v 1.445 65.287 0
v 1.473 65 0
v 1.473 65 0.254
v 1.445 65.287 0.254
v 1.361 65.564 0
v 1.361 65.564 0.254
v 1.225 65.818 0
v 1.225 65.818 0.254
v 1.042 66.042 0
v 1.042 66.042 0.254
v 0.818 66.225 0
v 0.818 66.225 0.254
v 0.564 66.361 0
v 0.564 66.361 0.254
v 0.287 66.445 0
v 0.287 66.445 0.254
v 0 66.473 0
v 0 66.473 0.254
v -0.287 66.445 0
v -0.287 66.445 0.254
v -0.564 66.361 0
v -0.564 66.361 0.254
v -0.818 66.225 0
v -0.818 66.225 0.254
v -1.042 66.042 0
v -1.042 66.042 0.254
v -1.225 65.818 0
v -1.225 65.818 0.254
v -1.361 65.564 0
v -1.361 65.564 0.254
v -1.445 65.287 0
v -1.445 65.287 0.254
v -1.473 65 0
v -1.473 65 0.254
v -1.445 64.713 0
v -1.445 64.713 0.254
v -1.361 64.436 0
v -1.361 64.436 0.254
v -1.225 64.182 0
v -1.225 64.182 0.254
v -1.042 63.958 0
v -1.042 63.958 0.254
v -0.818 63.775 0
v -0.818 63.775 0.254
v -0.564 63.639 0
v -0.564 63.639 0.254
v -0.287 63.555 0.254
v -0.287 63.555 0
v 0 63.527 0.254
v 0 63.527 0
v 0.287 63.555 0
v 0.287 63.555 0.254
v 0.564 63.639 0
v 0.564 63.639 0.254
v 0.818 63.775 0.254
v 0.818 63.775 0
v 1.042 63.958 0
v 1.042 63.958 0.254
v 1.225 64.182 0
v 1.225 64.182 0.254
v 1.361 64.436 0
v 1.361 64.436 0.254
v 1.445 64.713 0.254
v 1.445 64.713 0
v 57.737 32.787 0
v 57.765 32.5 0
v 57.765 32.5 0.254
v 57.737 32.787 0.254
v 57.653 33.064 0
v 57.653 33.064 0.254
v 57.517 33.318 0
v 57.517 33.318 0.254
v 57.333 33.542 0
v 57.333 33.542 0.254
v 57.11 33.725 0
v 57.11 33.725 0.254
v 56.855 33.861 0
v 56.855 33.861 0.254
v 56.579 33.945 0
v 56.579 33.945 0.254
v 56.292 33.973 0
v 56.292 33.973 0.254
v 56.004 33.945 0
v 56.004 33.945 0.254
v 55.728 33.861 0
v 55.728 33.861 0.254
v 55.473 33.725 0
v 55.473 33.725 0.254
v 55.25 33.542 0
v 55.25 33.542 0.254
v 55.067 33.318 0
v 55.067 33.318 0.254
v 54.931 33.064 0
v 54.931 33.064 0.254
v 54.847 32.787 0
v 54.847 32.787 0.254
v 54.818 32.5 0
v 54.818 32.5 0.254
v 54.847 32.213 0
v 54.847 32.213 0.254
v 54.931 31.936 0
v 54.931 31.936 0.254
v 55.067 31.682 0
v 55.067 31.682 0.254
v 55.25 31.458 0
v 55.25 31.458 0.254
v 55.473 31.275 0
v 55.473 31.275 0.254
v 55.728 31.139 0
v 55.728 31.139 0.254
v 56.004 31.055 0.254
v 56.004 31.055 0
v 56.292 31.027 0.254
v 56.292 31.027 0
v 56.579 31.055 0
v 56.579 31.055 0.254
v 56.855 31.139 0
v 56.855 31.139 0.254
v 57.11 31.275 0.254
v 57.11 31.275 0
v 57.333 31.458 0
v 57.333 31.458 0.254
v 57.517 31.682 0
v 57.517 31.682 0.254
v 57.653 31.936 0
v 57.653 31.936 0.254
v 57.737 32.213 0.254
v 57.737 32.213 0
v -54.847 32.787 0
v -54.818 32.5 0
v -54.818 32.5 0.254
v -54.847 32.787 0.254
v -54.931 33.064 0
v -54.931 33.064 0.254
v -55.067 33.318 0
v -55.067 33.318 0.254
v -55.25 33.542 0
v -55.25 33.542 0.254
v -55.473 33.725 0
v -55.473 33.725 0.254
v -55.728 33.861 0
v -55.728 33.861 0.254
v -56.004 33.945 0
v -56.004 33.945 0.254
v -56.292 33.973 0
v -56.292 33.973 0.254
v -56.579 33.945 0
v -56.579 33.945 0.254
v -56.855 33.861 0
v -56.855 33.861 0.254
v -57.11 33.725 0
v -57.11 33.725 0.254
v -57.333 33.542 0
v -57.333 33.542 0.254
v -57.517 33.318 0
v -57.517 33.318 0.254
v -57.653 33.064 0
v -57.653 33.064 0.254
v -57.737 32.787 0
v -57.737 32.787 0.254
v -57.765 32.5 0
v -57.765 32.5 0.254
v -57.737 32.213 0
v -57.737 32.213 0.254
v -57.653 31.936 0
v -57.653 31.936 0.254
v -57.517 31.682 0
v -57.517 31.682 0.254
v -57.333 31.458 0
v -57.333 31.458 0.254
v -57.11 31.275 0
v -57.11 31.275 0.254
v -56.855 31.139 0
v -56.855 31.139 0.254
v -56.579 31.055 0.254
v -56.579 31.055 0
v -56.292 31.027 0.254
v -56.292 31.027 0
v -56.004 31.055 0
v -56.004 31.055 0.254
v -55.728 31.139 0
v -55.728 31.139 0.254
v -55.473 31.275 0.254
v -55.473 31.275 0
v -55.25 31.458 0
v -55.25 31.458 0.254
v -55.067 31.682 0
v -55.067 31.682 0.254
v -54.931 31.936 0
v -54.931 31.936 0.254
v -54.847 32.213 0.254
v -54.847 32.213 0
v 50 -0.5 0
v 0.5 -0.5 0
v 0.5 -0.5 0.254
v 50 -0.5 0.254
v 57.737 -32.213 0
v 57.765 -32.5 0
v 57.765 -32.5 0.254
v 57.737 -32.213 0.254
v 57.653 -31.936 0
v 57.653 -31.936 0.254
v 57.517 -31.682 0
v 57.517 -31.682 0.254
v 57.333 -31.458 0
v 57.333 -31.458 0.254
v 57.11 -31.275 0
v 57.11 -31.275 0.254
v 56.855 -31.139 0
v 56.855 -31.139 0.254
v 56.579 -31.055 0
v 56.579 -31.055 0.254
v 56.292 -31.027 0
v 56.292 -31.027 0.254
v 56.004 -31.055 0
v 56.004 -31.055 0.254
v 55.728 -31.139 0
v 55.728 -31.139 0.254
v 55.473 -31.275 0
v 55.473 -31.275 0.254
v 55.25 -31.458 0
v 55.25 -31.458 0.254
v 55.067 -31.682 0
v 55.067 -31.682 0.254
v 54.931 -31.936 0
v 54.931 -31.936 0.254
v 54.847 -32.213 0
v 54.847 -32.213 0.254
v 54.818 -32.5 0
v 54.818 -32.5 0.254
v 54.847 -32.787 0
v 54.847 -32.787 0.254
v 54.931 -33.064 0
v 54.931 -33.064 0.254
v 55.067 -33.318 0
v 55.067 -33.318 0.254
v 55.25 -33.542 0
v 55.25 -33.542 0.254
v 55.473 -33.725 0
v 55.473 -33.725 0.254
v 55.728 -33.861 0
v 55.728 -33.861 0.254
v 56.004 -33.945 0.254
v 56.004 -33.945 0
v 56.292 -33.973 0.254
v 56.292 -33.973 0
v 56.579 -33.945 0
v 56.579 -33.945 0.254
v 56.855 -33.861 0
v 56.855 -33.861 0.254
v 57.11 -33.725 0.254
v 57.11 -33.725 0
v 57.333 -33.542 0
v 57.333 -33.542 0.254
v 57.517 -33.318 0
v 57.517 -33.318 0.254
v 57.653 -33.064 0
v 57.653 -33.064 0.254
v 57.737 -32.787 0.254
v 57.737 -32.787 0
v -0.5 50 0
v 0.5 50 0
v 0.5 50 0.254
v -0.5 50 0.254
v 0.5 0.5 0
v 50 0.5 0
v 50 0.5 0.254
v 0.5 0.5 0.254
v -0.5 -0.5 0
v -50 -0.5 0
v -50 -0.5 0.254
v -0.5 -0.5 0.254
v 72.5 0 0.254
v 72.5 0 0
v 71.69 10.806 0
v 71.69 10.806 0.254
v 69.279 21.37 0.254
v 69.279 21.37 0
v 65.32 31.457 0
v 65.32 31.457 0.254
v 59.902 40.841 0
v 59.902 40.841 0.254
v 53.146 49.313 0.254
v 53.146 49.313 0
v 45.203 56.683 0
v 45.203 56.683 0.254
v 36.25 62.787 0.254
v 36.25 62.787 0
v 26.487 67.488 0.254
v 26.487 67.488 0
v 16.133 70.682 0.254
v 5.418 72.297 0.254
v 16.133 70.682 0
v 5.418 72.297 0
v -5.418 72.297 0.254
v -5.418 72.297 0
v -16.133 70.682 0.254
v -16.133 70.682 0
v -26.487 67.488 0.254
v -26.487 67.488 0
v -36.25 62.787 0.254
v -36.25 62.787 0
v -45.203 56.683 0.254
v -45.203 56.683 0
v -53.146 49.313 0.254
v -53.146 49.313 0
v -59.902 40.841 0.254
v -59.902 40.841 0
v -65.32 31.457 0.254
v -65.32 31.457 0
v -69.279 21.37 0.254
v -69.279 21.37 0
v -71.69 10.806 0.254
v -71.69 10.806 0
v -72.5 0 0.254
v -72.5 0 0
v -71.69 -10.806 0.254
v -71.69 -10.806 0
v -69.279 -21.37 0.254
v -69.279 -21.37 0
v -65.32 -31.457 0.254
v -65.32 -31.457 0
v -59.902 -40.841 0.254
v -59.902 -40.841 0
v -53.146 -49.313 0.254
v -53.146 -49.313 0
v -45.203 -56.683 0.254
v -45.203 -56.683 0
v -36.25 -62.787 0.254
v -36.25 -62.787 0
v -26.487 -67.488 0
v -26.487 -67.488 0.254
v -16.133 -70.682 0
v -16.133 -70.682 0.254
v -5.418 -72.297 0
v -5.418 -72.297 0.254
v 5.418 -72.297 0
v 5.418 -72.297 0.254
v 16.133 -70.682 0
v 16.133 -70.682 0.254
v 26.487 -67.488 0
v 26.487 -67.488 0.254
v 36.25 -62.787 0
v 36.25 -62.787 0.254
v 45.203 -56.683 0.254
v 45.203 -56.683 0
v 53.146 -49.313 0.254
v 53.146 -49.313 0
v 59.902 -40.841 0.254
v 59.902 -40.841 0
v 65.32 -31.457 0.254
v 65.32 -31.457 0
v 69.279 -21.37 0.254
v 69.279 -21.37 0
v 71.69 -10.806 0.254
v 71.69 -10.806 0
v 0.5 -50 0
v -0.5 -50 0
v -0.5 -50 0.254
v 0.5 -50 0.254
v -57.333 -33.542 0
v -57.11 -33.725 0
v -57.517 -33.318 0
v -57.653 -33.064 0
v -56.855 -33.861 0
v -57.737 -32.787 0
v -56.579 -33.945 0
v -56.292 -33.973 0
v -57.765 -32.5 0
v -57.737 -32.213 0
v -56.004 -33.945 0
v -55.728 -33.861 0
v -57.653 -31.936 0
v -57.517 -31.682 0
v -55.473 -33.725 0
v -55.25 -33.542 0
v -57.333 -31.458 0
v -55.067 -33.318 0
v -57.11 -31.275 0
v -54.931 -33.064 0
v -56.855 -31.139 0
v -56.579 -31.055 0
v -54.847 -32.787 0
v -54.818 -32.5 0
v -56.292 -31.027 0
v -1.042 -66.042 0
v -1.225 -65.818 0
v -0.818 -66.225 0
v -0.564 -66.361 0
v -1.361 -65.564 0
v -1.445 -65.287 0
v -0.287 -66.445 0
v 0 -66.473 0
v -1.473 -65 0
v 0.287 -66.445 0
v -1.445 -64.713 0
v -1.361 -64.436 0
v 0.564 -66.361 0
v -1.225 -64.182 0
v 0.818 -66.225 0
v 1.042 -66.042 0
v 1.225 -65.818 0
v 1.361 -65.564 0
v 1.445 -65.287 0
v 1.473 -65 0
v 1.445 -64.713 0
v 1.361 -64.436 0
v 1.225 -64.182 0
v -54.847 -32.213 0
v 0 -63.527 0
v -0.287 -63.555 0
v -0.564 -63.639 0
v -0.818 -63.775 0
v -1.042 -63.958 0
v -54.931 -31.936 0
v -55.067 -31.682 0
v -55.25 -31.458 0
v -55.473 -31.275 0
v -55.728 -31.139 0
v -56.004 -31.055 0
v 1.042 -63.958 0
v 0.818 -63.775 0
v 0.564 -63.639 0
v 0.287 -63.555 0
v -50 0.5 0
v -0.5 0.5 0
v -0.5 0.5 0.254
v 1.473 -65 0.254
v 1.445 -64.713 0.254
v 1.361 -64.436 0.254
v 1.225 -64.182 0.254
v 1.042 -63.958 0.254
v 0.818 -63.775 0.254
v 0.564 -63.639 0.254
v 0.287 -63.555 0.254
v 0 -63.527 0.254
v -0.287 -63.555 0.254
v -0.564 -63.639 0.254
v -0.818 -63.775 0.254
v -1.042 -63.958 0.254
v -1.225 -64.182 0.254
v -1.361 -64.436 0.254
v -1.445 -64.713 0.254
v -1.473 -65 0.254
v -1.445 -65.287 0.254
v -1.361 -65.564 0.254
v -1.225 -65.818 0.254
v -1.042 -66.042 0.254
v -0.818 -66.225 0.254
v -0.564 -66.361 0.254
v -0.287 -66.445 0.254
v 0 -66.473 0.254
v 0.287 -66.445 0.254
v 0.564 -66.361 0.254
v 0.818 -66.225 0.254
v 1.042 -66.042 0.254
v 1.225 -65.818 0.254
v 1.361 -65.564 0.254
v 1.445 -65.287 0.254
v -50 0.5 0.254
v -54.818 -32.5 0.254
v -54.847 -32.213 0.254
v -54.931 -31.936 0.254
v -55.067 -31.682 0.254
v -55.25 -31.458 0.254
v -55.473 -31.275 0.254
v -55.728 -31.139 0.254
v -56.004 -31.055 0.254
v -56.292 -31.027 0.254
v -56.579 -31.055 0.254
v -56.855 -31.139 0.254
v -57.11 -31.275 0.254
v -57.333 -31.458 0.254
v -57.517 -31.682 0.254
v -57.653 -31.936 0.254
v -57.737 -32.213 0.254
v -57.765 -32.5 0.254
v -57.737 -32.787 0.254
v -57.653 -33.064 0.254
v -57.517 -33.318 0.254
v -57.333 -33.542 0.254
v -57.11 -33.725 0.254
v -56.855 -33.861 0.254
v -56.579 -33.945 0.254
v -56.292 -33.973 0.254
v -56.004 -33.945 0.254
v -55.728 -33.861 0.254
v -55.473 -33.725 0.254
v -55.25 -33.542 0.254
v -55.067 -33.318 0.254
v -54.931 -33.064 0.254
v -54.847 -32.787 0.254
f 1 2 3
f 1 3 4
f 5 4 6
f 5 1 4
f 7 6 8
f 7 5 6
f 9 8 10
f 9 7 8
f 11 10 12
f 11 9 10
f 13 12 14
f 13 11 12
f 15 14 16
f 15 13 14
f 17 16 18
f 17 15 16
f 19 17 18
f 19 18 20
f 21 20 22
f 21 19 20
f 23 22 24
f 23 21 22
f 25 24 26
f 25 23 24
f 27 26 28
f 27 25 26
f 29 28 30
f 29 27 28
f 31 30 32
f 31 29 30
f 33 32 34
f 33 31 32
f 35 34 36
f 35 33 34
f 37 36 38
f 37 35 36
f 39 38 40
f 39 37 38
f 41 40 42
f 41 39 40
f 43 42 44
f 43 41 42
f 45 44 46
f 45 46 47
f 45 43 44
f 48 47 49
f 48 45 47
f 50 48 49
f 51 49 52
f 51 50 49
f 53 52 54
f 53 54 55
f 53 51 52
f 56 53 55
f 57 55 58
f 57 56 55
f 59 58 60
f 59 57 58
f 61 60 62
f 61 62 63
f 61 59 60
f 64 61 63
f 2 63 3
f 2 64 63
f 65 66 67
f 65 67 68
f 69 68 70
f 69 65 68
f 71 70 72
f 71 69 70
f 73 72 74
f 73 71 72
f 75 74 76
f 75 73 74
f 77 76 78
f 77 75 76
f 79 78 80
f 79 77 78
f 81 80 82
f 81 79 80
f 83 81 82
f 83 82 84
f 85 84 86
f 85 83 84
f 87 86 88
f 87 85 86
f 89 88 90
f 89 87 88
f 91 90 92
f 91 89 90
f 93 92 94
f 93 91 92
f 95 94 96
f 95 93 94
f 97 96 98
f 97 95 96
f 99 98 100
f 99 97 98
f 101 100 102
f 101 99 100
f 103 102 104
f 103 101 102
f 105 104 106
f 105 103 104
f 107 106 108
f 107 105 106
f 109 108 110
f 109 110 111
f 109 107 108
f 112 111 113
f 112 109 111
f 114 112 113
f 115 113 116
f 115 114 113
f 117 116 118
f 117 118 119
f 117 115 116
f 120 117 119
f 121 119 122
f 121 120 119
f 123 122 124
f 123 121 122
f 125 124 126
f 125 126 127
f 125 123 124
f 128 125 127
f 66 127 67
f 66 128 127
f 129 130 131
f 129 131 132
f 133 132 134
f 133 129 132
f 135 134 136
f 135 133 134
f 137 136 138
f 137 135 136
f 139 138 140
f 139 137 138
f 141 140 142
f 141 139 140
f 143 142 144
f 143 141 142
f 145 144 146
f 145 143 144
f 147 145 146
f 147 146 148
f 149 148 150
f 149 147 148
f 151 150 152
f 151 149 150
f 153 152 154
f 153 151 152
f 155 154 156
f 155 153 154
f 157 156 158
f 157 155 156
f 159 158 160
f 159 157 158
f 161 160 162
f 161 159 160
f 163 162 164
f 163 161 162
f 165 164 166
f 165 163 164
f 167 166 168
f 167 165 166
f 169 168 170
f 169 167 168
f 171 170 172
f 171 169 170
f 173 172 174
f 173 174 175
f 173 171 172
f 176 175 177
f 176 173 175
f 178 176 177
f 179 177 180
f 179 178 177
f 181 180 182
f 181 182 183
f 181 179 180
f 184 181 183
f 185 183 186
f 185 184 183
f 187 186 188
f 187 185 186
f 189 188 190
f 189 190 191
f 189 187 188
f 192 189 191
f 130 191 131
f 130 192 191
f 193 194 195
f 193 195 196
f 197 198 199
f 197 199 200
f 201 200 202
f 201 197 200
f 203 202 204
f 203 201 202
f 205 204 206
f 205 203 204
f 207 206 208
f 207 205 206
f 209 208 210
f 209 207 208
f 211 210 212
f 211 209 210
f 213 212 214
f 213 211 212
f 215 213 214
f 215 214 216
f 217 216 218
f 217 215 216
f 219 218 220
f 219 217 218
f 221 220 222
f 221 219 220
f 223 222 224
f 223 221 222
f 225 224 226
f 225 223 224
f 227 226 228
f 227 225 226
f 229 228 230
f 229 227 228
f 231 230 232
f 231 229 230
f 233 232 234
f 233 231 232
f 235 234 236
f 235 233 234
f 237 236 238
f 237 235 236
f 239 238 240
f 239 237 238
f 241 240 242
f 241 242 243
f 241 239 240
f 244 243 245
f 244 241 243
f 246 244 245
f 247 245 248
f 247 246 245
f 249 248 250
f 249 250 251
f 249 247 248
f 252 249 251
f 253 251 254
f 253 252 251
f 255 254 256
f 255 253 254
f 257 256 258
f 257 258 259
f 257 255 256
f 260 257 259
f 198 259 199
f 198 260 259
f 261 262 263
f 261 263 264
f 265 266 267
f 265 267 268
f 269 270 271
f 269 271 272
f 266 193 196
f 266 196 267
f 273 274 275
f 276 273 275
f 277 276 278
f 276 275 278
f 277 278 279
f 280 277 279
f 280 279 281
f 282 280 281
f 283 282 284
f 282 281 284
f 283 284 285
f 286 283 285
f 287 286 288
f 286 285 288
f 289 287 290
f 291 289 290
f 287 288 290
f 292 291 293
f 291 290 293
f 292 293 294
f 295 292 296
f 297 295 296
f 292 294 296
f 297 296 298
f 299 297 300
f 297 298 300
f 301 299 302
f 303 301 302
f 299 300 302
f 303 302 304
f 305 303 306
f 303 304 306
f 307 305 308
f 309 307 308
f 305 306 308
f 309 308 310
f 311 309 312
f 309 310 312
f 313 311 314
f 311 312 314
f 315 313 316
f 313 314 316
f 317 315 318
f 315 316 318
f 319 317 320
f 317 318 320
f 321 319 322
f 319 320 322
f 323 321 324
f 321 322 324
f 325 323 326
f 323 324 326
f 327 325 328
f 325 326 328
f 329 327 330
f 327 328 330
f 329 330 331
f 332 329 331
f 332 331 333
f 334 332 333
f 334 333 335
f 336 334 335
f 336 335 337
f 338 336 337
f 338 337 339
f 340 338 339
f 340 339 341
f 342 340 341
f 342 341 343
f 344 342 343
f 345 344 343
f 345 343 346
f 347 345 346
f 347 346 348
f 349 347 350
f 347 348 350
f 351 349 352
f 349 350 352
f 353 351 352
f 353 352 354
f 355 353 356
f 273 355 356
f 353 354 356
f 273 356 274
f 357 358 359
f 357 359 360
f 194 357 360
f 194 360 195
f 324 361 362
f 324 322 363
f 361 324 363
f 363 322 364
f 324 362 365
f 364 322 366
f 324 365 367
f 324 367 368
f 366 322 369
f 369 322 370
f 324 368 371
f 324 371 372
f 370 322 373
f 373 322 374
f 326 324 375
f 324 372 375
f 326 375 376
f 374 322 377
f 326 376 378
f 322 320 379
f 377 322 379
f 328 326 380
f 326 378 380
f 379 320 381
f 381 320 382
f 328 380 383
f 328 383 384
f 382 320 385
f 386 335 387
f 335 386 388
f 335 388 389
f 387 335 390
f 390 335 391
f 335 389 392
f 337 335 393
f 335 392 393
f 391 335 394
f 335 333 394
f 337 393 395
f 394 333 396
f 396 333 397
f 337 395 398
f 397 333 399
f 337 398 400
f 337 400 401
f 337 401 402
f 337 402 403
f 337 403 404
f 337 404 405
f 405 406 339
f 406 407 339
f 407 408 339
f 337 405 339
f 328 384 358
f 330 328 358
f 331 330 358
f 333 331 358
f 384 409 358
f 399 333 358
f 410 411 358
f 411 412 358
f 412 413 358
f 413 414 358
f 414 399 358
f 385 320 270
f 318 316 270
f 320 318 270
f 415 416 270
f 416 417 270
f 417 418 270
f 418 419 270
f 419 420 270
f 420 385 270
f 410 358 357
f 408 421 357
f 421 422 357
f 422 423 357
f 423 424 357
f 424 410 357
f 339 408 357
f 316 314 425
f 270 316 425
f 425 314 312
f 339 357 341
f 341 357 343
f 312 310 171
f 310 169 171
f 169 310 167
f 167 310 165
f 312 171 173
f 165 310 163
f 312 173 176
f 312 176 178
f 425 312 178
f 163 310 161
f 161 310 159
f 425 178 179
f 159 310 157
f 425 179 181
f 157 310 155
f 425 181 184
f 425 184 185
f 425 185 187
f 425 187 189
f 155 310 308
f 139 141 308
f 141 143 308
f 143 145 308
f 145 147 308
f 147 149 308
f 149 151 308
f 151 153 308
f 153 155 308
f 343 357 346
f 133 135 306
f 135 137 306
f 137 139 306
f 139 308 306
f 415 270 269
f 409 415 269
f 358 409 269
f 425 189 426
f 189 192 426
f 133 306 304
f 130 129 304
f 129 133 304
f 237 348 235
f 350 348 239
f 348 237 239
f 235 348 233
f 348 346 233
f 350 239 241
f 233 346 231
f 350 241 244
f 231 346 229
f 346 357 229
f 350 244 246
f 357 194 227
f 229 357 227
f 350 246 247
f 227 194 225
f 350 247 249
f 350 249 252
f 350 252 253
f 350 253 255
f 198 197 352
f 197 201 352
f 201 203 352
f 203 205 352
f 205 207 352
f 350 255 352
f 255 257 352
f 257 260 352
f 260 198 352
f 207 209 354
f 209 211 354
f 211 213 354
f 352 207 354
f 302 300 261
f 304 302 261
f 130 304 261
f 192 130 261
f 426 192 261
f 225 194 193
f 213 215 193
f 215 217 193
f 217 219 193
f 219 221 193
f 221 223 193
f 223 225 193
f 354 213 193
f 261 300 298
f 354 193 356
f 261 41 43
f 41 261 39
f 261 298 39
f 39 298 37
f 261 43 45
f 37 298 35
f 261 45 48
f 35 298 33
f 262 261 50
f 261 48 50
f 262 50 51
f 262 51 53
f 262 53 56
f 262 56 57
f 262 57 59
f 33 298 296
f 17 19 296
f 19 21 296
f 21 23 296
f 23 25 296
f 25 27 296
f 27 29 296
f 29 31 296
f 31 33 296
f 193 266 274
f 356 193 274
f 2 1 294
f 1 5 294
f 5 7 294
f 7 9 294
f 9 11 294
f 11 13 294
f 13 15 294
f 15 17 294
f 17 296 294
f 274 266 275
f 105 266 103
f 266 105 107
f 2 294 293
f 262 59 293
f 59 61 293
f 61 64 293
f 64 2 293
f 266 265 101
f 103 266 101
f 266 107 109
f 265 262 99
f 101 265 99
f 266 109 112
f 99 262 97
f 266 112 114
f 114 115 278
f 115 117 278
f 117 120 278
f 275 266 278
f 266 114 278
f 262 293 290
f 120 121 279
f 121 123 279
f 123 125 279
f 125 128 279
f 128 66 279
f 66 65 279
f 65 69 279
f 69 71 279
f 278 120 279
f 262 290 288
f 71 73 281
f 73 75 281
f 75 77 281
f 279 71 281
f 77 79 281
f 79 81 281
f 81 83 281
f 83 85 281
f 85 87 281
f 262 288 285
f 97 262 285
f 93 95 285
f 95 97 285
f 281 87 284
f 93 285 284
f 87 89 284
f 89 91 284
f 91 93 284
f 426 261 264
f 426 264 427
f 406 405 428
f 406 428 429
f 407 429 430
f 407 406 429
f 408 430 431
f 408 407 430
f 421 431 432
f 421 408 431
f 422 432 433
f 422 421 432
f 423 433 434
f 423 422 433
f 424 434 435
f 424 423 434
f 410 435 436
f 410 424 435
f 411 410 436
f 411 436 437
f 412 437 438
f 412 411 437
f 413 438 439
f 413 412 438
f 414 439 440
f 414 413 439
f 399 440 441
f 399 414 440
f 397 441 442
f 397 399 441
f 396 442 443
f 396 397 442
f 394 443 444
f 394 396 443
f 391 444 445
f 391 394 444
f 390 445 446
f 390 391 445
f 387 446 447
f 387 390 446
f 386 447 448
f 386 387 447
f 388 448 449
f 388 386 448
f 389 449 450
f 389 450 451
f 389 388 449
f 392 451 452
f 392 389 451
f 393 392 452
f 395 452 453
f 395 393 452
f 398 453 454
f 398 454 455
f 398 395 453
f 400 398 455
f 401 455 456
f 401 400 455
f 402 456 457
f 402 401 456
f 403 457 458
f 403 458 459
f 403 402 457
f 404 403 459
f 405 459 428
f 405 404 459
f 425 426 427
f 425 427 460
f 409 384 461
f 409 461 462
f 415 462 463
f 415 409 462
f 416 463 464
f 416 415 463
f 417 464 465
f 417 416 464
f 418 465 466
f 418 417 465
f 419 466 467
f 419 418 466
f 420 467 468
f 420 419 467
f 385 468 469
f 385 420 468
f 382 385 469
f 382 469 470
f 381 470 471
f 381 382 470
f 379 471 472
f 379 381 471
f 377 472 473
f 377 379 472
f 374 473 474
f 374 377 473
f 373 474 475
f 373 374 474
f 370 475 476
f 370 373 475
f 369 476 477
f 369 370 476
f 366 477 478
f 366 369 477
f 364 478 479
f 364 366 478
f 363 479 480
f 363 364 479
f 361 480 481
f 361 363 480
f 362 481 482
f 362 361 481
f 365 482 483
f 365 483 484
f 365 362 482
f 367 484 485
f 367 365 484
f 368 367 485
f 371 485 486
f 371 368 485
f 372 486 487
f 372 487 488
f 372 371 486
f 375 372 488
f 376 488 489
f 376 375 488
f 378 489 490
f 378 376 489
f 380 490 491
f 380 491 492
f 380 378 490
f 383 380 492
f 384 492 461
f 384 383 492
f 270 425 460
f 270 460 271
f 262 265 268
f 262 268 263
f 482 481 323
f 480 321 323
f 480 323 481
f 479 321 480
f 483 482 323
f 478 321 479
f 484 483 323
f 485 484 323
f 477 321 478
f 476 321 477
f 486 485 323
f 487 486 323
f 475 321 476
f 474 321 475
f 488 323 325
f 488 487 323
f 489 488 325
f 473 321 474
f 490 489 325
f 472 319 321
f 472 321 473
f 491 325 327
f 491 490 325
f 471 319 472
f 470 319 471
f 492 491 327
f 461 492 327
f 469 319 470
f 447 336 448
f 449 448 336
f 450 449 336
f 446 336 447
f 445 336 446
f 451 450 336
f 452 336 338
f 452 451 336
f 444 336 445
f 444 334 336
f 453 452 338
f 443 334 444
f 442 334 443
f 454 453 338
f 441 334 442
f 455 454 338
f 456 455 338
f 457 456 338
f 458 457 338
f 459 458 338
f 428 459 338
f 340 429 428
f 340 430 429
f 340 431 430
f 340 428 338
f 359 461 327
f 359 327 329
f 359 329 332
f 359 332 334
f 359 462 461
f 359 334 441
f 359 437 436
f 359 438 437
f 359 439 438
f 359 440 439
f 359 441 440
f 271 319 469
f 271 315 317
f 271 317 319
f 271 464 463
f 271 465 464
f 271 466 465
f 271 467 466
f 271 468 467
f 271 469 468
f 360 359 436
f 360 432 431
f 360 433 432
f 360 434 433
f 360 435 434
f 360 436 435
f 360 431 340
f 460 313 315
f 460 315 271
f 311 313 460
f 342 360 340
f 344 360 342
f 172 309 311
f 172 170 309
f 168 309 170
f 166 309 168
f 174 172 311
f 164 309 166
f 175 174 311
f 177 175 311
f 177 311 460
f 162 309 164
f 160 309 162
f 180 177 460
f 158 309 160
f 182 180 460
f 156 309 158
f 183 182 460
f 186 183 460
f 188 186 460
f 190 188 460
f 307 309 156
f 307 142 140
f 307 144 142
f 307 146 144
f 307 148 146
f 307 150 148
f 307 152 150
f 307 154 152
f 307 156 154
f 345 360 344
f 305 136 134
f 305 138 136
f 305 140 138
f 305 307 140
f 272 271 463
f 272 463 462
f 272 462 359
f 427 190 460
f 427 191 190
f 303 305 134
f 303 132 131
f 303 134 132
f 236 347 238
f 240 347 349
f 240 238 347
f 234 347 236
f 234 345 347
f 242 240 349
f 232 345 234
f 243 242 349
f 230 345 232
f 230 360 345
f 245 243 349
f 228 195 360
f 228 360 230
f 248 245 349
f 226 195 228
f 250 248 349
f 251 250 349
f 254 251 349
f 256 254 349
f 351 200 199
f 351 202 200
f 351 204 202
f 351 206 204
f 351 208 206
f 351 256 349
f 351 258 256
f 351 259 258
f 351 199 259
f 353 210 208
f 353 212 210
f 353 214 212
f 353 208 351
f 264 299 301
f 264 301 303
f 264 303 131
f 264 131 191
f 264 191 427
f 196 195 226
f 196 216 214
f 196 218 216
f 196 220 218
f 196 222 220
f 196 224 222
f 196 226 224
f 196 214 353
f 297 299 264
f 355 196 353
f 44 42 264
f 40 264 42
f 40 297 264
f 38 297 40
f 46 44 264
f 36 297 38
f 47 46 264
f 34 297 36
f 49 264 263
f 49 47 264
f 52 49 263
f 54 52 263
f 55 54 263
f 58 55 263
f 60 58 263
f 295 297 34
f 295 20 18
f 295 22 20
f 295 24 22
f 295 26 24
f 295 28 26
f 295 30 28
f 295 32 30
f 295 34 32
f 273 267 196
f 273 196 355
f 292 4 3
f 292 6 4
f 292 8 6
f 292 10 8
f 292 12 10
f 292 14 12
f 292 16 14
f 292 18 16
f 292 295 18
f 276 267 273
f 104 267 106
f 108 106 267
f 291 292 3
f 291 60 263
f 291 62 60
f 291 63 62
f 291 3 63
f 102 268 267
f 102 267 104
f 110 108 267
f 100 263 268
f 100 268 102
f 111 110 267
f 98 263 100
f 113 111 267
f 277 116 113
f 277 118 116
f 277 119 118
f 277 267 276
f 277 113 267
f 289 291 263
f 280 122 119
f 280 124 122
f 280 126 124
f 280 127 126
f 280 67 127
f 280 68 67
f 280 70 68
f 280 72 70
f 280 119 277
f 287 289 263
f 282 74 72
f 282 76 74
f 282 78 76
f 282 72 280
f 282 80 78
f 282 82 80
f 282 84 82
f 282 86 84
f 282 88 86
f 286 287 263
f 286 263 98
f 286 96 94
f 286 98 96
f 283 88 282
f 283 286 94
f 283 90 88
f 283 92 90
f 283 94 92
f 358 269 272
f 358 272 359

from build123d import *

# Parameters (mm, degrees)
SKETCH2_R           = 72.5
SKETCH2_R_2         = 1.4732
BOSS_EXTRUDE3_DEPTH = 0.254


with BuildPart() as part:
    # Sketch2 → Boss-Extrude3 (new body)
    with BuildSketch(Plane.XY):
        Circle(SKETCH2_R)
        with Locations((56.291651246, -32.5)):
            Circle(SKETCH2_R_2, mode=Mode.SUBTRACT)
        with Locations((0, -65)):
            Circle(SKETCH2_R_2, mode=Mode.SUBTRACT)
        with Locations((-56.291651246, -32.5)):
            Circle(SKETCH2_R_2, mode=Mode.SUBTRACT)
        with Locations((-56.291651246, 32.5)):
            Circle(SKETCH2_R_2, mode=Mode.SUBTRACT)
        with Locations((0, 65)):
            Circle(SKETCH2_R_2, mode=Mode.SUBTRACT)
        with Locations((56.291651246, 32.5)):
            Circle(SKETCH2_R_2, mode=Mode.SUBTRACT)
        Polygon((-0.5, 50), (-0.5, 0.5), (-50, 0.5), (-50, -0.5), (-0.5, -0.5), (-0.5, -50), (0.5, -50), (0.5, -0.5), (50, -0.5), (50, 0.5), (0.5, 0.5), (0.5, 50), align=None, mode=Mode.SUBTRACT)
    extrude(amount=BOSS_EXTRUDE3_DEPTH)


solid = part.part
